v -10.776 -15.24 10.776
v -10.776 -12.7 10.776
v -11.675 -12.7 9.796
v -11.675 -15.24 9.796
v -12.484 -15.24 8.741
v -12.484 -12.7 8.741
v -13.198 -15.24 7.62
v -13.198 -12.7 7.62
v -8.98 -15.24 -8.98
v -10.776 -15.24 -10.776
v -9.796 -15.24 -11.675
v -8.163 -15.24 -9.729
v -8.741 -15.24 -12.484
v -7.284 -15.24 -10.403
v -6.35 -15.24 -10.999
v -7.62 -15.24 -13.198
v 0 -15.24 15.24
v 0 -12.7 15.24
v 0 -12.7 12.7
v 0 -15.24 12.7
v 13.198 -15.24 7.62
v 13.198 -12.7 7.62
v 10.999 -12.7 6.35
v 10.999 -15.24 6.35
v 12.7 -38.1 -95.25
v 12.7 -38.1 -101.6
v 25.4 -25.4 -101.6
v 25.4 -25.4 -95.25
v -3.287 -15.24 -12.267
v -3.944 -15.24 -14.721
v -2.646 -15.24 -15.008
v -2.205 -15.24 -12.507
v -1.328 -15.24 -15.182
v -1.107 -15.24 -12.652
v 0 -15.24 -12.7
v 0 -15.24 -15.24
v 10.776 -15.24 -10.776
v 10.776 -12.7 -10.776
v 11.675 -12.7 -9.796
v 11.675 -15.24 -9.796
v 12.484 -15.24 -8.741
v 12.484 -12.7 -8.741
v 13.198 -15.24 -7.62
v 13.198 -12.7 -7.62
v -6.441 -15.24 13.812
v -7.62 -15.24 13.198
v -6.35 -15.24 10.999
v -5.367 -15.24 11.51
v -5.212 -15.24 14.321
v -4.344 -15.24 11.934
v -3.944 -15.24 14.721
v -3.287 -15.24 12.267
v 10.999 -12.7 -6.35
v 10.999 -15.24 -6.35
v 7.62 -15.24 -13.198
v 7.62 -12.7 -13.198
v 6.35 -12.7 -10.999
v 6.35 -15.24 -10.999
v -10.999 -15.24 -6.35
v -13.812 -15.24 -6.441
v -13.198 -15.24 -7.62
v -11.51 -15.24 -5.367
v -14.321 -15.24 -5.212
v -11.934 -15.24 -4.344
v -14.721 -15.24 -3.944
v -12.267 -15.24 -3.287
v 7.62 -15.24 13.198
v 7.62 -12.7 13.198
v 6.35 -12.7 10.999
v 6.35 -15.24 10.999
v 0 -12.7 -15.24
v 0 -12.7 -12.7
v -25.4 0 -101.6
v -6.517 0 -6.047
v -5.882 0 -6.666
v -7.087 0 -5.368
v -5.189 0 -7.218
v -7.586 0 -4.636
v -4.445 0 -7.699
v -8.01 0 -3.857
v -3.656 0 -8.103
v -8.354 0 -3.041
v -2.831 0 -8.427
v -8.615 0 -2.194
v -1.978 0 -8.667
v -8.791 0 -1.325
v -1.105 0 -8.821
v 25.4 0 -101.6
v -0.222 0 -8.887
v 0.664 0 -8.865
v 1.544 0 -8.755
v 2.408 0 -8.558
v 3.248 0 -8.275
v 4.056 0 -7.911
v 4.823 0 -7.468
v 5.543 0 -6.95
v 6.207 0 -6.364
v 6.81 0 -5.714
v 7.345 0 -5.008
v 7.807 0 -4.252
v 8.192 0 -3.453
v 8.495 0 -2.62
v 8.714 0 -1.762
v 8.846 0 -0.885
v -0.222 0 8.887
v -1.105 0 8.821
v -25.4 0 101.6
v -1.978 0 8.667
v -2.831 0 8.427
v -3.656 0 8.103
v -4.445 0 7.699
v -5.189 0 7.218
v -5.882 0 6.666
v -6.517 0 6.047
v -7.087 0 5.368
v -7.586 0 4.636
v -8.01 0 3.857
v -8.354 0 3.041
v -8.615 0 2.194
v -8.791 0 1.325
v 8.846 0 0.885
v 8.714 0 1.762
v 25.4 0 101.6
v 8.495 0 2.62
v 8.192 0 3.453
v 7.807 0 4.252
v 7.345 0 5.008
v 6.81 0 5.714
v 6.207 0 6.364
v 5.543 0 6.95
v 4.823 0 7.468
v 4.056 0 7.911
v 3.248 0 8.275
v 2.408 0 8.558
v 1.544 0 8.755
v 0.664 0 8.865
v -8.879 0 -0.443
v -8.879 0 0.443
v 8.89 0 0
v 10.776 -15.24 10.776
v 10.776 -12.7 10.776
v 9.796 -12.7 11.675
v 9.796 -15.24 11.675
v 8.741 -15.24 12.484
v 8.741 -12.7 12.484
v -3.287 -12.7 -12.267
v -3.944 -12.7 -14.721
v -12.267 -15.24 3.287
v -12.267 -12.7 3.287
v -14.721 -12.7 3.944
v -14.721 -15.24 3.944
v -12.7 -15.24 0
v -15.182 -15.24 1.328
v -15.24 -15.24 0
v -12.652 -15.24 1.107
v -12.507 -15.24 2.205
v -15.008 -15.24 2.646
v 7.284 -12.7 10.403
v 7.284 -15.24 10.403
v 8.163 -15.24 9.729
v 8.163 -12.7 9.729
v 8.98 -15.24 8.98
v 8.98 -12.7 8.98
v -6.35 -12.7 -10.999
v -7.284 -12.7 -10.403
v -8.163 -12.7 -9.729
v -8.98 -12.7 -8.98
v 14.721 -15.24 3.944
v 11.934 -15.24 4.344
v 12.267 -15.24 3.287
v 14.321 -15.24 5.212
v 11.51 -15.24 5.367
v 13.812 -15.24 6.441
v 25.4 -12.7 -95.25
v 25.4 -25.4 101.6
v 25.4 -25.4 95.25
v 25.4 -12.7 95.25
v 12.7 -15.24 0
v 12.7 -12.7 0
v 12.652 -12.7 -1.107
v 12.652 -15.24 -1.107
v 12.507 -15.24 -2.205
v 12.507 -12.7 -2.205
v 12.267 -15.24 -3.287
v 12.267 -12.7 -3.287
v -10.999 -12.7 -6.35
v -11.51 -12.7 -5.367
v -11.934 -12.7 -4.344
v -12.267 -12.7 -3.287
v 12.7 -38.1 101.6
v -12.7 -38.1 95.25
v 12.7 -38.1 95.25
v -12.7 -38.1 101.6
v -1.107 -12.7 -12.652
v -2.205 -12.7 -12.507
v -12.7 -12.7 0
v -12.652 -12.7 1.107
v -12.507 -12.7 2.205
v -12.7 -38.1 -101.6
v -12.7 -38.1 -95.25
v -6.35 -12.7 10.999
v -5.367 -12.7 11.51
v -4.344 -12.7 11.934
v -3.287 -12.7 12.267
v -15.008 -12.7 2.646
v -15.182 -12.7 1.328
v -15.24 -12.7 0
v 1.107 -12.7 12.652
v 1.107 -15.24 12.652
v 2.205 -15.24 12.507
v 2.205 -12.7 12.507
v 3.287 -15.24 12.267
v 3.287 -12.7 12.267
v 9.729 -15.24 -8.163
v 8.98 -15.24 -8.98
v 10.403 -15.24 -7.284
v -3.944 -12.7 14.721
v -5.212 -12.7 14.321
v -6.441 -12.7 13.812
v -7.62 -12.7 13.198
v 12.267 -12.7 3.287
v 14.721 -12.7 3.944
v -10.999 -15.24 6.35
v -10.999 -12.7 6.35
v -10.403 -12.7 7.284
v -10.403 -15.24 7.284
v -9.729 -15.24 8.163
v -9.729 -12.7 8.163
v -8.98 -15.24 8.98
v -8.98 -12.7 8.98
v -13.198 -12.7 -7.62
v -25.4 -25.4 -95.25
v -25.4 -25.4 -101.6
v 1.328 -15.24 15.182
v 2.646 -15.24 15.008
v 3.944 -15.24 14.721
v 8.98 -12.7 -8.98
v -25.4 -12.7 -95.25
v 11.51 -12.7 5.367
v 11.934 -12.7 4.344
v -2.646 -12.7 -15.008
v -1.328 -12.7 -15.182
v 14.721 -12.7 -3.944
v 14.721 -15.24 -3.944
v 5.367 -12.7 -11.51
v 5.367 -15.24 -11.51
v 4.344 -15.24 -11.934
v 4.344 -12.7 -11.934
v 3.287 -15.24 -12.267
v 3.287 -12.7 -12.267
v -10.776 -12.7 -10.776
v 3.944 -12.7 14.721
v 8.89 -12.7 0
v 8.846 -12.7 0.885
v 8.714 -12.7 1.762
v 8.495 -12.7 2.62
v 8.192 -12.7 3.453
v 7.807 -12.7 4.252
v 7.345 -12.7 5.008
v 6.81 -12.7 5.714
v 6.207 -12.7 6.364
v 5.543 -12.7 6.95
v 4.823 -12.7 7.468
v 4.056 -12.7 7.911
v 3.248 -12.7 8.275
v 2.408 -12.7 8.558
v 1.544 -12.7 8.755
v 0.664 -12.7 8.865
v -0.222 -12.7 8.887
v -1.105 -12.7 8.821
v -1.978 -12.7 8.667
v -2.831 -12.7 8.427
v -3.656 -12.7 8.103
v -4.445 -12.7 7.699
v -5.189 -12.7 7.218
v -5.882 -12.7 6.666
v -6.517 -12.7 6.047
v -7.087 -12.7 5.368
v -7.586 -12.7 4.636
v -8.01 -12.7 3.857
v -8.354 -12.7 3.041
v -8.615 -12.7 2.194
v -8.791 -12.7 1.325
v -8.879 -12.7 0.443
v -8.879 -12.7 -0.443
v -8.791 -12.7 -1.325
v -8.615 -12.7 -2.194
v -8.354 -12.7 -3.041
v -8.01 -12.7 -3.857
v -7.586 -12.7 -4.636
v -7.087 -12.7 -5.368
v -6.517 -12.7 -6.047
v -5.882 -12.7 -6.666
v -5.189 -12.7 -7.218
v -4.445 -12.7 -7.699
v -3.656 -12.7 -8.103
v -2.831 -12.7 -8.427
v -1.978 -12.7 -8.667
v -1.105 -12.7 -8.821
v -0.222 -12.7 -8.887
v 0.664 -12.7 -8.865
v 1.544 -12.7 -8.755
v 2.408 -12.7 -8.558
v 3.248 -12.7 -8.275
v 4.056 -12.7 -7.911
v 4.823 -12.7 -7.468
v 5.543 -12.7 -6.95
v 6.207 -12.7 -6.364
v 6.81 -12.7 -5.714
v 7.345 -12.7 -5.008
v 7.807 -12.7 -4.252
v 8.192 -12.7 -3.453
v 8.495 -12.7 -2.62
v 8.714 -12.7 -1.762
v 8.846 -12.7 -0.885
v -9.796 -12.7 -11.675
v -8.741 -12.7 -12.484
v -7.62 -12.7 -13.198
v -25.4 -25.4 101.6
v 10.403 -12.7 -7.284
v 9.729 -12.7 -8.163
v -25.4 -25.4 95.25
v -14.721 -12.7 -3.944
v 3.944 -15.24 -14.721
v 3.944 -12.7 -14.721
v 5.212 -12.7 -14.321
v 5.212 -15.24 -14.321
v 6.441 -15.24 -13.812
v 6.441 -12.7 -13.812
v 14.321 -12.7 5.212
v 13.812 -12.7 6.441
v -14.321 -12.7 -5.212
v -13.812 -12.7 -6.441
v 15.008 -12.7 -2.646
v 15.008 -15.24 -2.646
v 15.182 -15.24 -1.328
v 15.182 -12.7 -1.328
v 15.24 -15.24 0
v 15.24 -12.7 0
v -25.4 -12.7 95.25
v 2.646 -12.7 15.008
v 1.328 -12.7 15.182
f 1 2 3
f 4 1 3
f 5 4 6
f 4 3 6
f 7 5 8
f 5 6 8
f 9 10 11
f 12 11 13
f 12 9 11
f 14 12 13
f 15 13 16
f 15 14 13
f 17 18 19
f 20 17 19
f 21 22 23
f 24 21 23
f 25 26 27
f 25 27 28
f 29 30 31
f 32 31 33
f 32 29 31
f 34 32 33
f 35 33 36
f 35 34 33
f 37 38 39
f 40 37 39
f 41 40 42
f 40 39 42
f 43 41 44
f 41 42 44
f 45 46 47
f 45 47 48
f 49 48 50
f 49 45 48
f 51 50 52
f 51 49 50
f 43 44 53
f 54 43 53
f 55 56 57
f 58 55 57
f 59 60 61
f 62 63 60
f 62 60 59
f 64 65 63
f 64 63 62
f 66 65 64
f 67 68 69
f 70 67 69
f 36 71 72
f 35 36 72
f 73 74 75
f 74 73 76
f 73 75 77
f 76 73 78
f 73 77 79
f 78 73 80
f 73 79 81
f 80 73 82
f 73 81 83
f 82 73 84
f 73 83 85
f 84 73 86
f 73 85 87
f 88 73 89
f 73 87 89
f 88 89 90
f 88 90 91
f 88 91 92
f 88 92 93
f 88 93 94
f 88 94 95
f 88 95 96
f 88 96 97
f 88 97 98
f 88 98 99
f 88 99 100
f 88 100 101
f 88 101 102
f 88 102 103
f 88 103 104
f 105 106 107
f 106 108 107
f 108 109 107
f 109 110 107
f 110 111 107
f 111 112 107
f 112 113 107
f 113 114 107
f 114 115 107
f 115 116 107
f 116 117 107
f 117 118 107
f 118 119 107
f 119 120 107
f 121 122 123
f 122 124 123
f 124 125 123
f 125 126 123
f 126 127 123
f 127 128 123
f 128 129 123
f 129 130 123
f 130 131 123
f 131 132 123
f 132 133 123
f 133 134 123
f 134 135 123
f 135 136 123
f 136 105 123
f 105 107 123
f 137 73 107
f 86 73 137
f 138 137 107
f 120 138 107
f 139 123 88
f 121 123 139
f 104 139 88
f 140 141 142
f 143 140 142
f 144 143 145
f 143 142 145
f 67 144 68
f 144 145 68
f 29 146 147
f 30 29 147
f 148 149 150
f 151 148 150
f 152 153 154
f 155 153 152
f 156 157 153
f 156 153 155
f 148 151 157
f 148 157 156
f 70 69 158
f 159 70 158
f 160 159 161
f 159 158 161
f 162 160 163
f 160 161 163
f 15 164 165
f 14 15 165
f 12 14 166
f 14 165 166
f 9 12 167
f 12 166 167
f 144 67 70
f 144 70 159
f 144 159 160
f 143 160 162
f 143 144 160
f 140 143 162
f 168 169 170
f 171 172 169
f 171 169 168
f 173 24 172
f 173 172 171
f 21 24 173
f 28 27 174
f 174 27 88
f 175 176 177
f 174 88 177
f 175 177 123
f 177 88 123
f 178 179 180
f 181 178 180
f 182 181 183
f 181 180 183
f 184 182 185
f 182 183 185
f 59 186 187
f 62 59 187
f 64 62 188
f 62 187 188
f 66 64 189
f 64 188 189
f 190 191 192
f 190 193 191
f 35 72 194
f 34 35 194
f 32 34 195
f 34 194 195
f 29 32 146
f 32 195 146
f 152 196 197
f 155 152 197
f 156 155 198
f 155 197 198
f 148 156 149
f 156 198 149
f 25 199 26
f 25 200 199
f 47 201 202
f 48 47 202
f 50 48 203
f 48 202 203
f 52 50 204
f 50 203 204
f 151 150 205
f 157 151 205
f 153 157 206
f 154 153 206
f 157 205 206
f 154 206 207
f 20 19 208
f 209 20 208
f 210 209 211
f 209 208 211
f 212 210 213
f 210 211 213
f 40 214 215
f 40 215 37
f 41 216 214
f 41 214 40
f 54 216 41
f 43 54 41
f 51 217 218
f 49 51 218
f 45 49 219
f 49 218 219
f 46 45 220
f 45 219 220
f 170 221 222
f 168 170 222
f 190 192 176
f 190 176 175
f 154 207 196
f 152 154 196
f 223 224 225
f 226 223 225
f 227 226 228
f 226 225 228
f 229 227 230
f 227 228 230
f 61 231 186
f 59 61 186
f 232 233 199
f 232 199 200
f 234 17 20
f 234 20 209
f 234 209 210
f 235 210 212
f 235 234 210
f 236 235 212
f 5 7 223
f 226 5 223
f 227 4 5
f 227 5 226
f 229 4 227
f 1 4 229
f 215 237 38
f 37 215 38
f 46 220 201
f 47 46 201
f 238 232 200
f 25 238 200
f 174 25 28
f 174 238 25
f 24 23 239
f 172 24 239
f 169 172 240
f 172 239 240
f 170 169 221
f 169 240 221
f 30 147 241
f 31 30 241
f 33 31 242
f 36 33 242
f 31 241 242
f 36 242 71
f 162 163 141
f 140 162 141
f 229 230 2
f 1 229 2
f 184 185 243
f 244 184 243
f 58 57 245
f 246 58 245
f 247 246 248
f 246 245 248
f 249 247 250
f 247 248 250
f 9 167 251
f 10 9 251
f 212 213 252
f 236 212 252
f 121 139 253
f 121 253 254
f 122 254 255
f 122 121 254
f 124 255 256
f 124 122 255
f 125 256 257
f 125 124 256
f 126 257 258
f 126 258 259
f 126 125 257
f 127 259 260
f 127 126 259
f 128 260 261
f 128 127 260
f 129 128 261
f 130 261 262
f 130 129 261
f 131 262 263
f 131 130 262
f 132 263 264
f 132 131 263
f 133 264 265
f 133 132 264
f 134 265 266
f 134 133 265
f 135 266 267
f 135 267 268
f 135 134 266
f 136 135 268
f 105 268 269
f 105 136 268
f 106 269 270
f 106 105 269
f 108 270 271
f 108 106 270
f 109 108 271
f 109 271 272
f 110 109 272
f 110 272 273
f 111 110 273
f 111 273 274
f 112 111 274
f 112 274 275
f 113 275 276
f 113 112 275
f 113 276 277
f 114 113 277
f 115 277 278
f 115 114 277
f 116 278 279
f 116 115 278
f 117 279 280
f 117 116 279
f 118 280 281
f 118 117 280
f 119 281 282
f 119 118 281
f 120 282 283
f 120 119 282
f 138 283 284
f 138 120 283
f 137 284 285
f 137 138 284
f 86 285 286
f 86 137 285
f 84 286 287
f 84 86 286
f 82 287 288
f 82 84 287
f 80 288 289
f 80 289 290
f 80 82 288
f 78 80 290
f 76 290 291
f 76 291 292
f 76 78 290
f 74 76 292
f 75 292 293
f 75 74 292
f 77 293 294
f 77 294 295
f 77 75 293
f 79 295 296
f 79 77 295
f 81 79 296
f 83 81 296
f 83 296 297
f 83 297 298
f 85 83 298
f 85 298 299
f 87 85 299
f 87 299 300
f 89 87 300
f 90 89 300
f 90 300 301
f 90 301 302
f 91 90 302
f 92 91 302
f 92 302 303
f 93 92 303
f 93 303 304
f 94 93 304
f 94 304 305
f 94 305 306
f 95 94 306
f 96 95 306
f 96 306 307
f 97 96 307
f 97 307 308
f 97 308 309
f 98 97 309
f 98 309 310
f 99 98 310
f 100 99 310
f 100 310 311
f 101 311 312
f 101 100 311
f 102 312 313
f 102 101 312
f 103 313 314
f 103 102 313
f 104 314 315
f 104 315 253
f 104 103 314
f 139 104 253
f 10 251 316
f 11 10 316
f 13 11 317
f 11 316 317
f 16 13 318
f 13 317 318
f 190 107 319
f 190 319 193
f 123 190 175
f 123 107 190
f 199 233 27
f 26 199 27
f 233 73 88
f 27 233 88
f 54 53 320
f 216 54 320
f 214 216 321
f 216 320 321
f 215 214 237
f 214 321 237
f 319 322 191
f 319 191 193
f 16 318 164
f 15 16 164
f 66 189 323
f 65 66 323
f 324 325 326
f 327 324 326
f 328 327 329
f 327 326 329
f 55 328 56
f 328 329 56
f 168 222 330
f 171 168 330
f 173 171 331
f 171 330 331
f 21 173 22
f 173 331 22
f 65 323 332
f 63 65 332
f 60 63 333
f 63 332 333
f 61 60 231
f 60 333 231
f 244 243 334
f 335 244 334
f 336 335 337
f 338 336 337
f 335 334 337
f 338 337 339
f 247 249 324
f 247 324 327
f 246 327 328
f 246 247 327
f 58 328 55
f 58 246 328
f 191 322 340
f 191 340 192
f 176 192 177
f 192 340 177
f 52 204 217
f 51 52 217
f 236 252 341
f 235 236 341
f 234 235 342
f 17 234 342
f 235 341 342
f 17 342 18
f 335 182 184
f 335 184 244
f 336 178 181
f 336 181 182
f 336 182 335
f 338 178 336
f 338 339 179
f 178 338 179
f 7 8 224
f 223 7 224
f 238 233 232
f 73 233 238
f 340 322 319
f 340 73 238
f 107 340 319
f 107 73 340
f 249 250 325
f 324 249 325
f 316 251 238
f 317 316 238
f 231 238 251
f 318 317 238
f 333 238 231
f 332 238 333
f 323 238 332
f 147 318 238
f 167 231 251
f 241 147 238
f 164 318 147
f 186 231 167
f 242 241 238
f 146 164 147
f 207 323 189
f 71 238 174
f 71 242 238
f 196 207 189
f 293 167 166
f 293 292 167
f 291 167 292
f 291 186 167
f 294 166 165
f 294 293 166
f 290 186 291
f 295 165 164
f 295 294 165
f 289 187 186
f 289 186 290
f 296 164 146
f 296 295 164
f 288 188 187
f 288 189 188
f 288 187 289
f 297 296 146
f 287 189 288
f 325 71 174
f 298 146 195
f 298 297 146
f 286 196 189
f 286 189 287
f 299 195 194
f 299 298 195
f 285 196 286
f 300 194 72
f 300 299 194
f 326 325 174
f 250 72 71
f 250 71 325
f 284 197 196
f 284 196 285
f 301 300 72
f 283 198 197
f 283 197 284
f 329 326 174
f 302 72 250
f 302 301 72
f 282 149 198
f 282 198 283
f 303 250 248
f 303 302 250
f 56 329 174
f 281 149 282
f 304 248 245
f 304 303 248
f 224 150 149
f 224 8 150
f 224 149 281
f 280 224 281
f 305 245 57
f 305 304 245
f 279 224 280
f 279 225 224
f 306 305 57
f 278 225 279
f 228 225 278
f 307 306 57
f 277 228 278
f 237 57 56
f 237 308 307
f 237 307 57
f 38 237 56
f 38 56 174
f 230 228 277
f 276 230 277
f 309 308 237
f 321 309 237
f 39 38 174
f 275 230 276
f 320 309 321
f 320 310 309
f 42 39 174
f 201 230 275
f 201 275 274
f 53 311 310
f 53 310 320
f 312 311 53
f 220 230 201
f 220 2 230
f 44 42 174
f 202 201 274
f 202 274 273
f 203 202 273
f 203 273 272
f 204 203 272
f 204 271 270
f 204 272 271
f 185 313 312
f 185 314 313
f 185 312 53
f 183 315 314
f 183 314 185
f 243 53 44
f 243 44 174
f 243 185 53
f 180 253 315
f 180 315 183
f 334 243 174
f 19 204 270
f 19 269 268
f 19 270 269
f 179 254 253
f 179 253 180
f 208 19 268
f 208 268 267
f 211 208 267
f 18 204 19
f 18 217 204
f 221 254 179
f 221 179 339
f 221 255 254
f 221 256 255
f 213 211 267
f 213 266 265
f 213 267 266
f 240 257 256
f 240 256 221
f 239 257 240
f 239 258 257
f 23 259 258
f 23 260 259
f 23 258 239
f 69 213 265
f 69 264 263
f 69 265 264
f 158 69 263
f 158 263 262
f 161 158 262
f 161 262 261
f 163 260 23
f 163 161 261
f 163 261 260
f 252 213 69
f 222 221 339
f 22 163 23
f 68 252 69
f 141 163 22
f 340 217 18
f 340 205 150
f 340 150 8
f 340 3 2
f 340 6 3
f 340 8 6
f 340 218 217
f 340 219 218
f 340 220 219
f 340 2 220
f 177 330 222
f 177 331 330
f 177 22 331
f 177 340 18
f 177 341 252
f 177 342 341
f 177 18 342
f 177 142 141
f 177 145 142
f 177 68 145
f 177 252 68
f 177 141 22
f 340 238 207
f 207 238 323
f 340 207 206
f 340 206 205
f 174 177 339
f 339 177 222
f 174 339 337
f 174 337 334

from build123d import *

# Parameters (mm, degrees)
F0_W     = 50.8
F0_H     = 203.2
F0_R     = 8.89
F1_DEPTH = 12.7
F3_DEPTH = 2.54
F4_W     = 50.8
F4_H     = 6.35
F5_DEPTH = 25.4
F6_SIZE  = 12.7


with BuildPart() as f1:
    # F0 (on Front) → F1 (new body)
    with BuildSketch(Plane.XZ):
        Rectangle(F0_W, F0_H)
        Circle(F0_R, mode=Mode.SUBTRACT)
    extrude(amount=F1_DEPTH)

    # F2 (on face) → F3 (join)
    with BuildSketch(Plane.XZ.offset(12.7)):
        with BuildLine():
            Line((-13.1982271537, 7.62), (-10.9985226281, 6.35))
            ThreePointArc((-10.9985226281, 6.35), (-10.0755874217, 7.7312701484), (-8.9802561211, 8.9802561211))
            Line((-8.9802561211, 8.9802561211), (-10.7763073453, 10.7763073453))
            ThreePointArc((-10.7763073453, 10.7763073453), (-12.090704906, 9.2775241781), (-13.1982271537, 7.62))
        make_face()
        with BuildLine():
            Line((-15.24, 0), (-12.7, 0))
            ThreePointArc((-12.7, 0), (-12.5913497394, 1.6576826412), (-12.2672579939, 3.2870018728))
            Line((-12.2672579939, 3.2870018728), (-14.7207095926, 3.9444022474))
            ThreePointArc((-14.7207095926, 3.9444022474), (-15.1096196873, 1.9892191694), (-15.24, 0))
        make_face()
        with BuildLine():
            Line((-13.1982271537, -7.62), (-10.9985226281, -6.35))
            ThreePointArc((-10.9985226281, -6.35), (-11.7332700629, -4.860079591), (-12.2672579939, -3.2870018728))
            Line((-12.2672579939, -3.2870018728), (-14.7207095926, -3.9444022474))
            ThreePointArc((-14.7207095926, -3.9444022474), (-14.0799240755, -5.8320955092), (-13.1982271537, -7.62))
        make_face()
        with BuildLine():
            Line((-7.62, -13.1982271537), (-6.35, -10.9985226281))
            ThreePointArc((-6.35, -10.9985226281), (-7.7312701484, -10.0755874217), (-8.9802561211, -8.9802561211))
            Line((-8.9802561211, -8.9802561211), (-10.7763073453, -10.7763073453))
            ThreePointArc((-10.7763073453, -10.7763073453), (-9.2775241781, -12.090704906), (-7.62, -13.1982271537))
        make_face()
        with BuildLine():
            Line((0, -15.24), (0, -12.7))
            ThreePointArc((0, -12.7), (-1.6576826412, -12.5913497394), (-3.2870018728, -12.2672579939))
            Line((-3.2870018728, -12.2672579939), (-3.9444022474, -14.7207095926))
            ThreePointArc((-3.9444022474, -14.7207095926), (-1.9892191694, -15.1096196873), (0, -15.24))
        make_face()
        with BuildLine():
            Line((7.62, -13.1982271537), (6.35, -10.9985226281))
            ThreePointArc((6.35, -10.9985226281), (4.860079591, -11.7332700629), (3.2870018728, -12.2672579939))
            Line((3.2870018728, -12.2672579939), (3.9444022474, -14.7207095926))
            ThreePointArc((3.9444022474, -14.7207095926), (5.8320955092, -14.0799240755), (7.62, -13.1982271537))
        make_face()
        with BuildLine():
            Line((13.1982271537, -7.62), (10.9985226281, -6.35))
            ThreePointArc((10.9985226281, -6.35), (10.0755874217, -7.7312701484), (8.9802561211, -8.9802561211))
            Line((8.9802561211, -8.9802561211), (10.7763073453, -10.7763073453))
            ThreePointArc((10.7763073453, -10.7763073453), (12.090704906, -9.2775241781), (13.1982271537, -7.62))
        make_face()
        with BuildLine():
            Line((15.24, 0), (12.7, 0))
            ThreePointArc((12.7, 0), (12.5913497394, -1.6576826412), (12.2672579939, -3.2870018728))
            Line((12.2672579939, -3.2870018728), (14.7207095926, -3.9444022474))
            ThreePointArc((14.7207095926, -3.9444022474), (15.1096196873, -1.9892191694), (15.24, 0))
        make_face()
        with BuildLine():
            ThreePointArc((10.9985226281, 6.35), (11.7332700629, 4.860079591), (12.2672579939, 3.2870018728))
            Line((12.2672579939, 3.2870018728), (14.7207095926, 3.9444022474))
            ThreePointArc((14.7207095926, 3.9444022474), (14.0799240755, 5.8320955092), (13.1982271537, 7.62))
            Line((13.1982271537, 7.62), (10.9985226281, 6.35))
        make_face()
        with BuildLine():
            Line((7.62, 13.1982271537), (6.35, 10.9985226281))
            ThreePointArc((6.35, 10.9985226281), (7.7312701484, 10.0755874217), (8.9802561211, 8.9802561211))
            Line((8.9802561211, 8.9802561211), (10.7763073453, 10.7763073453))
            ThreePointArc((10.7763073453, 10.7763073453), (9.2775241781, 12.090704906), (7.62, 13.1982271537))
        make_face()
        with BuildLine():
            Line((0, 15.24), (0, 12.7))
            ThreePointArc((0, 12.7), (1.6576826412, 12.5913497394), (3.2870018728, 12.2672579939))
            Line((3.2870018728, 12.2672579939), (3.9444022474, 14.7207095926))
            ThreePointArc((3.9444022474, 14.7207095926), (1.9892191694, 15.1096196873), (0, 15.24))
        make_face()
        with BuildLine():
            Line((-7.62, 13.1982271537), (-6.35, 10.9985226281))
            ThreePointArc((-6.35, 10.9985226281), (-4.860079591, 11.7332700629), (-3.2870018728, 12.2672579939))
            Line((-3.2870018728, 12.2672579939), (-3.9444022474, 14.7207095926))
            ThreePointArc((-3.9444022474, 14.7207095926), (-5.8320955092, 14.0799240755), (-7.62, 13.1982271537))
        make_face()
    extrude(amount=F3_DEPTH)

    # F4 (on face) → F5 (join)
    with BuildSketch(Plane.XZ.offset(12.7)):
        with Locations((0, 98.425)):
            Rectangle(F4_W, F4_H)
        with Locations((0, -98.425)):
            Rectangle(F4_W, F4_H)
    extrude(amount=F5_DEPTH)

    # F6
    f6_edges = [f1.edges().sort_by_distance(p)[0] for p in [
        (-25.4, -38.1, -98.425),
        (25.4, -38.1, -98.425),
        (25.4, -38.1, 98.425),
        (-25.4, -38.1, 98.425),
    ]]
    chamfer(f6_edges, length=F6_SIZE)


solid = f1.part
